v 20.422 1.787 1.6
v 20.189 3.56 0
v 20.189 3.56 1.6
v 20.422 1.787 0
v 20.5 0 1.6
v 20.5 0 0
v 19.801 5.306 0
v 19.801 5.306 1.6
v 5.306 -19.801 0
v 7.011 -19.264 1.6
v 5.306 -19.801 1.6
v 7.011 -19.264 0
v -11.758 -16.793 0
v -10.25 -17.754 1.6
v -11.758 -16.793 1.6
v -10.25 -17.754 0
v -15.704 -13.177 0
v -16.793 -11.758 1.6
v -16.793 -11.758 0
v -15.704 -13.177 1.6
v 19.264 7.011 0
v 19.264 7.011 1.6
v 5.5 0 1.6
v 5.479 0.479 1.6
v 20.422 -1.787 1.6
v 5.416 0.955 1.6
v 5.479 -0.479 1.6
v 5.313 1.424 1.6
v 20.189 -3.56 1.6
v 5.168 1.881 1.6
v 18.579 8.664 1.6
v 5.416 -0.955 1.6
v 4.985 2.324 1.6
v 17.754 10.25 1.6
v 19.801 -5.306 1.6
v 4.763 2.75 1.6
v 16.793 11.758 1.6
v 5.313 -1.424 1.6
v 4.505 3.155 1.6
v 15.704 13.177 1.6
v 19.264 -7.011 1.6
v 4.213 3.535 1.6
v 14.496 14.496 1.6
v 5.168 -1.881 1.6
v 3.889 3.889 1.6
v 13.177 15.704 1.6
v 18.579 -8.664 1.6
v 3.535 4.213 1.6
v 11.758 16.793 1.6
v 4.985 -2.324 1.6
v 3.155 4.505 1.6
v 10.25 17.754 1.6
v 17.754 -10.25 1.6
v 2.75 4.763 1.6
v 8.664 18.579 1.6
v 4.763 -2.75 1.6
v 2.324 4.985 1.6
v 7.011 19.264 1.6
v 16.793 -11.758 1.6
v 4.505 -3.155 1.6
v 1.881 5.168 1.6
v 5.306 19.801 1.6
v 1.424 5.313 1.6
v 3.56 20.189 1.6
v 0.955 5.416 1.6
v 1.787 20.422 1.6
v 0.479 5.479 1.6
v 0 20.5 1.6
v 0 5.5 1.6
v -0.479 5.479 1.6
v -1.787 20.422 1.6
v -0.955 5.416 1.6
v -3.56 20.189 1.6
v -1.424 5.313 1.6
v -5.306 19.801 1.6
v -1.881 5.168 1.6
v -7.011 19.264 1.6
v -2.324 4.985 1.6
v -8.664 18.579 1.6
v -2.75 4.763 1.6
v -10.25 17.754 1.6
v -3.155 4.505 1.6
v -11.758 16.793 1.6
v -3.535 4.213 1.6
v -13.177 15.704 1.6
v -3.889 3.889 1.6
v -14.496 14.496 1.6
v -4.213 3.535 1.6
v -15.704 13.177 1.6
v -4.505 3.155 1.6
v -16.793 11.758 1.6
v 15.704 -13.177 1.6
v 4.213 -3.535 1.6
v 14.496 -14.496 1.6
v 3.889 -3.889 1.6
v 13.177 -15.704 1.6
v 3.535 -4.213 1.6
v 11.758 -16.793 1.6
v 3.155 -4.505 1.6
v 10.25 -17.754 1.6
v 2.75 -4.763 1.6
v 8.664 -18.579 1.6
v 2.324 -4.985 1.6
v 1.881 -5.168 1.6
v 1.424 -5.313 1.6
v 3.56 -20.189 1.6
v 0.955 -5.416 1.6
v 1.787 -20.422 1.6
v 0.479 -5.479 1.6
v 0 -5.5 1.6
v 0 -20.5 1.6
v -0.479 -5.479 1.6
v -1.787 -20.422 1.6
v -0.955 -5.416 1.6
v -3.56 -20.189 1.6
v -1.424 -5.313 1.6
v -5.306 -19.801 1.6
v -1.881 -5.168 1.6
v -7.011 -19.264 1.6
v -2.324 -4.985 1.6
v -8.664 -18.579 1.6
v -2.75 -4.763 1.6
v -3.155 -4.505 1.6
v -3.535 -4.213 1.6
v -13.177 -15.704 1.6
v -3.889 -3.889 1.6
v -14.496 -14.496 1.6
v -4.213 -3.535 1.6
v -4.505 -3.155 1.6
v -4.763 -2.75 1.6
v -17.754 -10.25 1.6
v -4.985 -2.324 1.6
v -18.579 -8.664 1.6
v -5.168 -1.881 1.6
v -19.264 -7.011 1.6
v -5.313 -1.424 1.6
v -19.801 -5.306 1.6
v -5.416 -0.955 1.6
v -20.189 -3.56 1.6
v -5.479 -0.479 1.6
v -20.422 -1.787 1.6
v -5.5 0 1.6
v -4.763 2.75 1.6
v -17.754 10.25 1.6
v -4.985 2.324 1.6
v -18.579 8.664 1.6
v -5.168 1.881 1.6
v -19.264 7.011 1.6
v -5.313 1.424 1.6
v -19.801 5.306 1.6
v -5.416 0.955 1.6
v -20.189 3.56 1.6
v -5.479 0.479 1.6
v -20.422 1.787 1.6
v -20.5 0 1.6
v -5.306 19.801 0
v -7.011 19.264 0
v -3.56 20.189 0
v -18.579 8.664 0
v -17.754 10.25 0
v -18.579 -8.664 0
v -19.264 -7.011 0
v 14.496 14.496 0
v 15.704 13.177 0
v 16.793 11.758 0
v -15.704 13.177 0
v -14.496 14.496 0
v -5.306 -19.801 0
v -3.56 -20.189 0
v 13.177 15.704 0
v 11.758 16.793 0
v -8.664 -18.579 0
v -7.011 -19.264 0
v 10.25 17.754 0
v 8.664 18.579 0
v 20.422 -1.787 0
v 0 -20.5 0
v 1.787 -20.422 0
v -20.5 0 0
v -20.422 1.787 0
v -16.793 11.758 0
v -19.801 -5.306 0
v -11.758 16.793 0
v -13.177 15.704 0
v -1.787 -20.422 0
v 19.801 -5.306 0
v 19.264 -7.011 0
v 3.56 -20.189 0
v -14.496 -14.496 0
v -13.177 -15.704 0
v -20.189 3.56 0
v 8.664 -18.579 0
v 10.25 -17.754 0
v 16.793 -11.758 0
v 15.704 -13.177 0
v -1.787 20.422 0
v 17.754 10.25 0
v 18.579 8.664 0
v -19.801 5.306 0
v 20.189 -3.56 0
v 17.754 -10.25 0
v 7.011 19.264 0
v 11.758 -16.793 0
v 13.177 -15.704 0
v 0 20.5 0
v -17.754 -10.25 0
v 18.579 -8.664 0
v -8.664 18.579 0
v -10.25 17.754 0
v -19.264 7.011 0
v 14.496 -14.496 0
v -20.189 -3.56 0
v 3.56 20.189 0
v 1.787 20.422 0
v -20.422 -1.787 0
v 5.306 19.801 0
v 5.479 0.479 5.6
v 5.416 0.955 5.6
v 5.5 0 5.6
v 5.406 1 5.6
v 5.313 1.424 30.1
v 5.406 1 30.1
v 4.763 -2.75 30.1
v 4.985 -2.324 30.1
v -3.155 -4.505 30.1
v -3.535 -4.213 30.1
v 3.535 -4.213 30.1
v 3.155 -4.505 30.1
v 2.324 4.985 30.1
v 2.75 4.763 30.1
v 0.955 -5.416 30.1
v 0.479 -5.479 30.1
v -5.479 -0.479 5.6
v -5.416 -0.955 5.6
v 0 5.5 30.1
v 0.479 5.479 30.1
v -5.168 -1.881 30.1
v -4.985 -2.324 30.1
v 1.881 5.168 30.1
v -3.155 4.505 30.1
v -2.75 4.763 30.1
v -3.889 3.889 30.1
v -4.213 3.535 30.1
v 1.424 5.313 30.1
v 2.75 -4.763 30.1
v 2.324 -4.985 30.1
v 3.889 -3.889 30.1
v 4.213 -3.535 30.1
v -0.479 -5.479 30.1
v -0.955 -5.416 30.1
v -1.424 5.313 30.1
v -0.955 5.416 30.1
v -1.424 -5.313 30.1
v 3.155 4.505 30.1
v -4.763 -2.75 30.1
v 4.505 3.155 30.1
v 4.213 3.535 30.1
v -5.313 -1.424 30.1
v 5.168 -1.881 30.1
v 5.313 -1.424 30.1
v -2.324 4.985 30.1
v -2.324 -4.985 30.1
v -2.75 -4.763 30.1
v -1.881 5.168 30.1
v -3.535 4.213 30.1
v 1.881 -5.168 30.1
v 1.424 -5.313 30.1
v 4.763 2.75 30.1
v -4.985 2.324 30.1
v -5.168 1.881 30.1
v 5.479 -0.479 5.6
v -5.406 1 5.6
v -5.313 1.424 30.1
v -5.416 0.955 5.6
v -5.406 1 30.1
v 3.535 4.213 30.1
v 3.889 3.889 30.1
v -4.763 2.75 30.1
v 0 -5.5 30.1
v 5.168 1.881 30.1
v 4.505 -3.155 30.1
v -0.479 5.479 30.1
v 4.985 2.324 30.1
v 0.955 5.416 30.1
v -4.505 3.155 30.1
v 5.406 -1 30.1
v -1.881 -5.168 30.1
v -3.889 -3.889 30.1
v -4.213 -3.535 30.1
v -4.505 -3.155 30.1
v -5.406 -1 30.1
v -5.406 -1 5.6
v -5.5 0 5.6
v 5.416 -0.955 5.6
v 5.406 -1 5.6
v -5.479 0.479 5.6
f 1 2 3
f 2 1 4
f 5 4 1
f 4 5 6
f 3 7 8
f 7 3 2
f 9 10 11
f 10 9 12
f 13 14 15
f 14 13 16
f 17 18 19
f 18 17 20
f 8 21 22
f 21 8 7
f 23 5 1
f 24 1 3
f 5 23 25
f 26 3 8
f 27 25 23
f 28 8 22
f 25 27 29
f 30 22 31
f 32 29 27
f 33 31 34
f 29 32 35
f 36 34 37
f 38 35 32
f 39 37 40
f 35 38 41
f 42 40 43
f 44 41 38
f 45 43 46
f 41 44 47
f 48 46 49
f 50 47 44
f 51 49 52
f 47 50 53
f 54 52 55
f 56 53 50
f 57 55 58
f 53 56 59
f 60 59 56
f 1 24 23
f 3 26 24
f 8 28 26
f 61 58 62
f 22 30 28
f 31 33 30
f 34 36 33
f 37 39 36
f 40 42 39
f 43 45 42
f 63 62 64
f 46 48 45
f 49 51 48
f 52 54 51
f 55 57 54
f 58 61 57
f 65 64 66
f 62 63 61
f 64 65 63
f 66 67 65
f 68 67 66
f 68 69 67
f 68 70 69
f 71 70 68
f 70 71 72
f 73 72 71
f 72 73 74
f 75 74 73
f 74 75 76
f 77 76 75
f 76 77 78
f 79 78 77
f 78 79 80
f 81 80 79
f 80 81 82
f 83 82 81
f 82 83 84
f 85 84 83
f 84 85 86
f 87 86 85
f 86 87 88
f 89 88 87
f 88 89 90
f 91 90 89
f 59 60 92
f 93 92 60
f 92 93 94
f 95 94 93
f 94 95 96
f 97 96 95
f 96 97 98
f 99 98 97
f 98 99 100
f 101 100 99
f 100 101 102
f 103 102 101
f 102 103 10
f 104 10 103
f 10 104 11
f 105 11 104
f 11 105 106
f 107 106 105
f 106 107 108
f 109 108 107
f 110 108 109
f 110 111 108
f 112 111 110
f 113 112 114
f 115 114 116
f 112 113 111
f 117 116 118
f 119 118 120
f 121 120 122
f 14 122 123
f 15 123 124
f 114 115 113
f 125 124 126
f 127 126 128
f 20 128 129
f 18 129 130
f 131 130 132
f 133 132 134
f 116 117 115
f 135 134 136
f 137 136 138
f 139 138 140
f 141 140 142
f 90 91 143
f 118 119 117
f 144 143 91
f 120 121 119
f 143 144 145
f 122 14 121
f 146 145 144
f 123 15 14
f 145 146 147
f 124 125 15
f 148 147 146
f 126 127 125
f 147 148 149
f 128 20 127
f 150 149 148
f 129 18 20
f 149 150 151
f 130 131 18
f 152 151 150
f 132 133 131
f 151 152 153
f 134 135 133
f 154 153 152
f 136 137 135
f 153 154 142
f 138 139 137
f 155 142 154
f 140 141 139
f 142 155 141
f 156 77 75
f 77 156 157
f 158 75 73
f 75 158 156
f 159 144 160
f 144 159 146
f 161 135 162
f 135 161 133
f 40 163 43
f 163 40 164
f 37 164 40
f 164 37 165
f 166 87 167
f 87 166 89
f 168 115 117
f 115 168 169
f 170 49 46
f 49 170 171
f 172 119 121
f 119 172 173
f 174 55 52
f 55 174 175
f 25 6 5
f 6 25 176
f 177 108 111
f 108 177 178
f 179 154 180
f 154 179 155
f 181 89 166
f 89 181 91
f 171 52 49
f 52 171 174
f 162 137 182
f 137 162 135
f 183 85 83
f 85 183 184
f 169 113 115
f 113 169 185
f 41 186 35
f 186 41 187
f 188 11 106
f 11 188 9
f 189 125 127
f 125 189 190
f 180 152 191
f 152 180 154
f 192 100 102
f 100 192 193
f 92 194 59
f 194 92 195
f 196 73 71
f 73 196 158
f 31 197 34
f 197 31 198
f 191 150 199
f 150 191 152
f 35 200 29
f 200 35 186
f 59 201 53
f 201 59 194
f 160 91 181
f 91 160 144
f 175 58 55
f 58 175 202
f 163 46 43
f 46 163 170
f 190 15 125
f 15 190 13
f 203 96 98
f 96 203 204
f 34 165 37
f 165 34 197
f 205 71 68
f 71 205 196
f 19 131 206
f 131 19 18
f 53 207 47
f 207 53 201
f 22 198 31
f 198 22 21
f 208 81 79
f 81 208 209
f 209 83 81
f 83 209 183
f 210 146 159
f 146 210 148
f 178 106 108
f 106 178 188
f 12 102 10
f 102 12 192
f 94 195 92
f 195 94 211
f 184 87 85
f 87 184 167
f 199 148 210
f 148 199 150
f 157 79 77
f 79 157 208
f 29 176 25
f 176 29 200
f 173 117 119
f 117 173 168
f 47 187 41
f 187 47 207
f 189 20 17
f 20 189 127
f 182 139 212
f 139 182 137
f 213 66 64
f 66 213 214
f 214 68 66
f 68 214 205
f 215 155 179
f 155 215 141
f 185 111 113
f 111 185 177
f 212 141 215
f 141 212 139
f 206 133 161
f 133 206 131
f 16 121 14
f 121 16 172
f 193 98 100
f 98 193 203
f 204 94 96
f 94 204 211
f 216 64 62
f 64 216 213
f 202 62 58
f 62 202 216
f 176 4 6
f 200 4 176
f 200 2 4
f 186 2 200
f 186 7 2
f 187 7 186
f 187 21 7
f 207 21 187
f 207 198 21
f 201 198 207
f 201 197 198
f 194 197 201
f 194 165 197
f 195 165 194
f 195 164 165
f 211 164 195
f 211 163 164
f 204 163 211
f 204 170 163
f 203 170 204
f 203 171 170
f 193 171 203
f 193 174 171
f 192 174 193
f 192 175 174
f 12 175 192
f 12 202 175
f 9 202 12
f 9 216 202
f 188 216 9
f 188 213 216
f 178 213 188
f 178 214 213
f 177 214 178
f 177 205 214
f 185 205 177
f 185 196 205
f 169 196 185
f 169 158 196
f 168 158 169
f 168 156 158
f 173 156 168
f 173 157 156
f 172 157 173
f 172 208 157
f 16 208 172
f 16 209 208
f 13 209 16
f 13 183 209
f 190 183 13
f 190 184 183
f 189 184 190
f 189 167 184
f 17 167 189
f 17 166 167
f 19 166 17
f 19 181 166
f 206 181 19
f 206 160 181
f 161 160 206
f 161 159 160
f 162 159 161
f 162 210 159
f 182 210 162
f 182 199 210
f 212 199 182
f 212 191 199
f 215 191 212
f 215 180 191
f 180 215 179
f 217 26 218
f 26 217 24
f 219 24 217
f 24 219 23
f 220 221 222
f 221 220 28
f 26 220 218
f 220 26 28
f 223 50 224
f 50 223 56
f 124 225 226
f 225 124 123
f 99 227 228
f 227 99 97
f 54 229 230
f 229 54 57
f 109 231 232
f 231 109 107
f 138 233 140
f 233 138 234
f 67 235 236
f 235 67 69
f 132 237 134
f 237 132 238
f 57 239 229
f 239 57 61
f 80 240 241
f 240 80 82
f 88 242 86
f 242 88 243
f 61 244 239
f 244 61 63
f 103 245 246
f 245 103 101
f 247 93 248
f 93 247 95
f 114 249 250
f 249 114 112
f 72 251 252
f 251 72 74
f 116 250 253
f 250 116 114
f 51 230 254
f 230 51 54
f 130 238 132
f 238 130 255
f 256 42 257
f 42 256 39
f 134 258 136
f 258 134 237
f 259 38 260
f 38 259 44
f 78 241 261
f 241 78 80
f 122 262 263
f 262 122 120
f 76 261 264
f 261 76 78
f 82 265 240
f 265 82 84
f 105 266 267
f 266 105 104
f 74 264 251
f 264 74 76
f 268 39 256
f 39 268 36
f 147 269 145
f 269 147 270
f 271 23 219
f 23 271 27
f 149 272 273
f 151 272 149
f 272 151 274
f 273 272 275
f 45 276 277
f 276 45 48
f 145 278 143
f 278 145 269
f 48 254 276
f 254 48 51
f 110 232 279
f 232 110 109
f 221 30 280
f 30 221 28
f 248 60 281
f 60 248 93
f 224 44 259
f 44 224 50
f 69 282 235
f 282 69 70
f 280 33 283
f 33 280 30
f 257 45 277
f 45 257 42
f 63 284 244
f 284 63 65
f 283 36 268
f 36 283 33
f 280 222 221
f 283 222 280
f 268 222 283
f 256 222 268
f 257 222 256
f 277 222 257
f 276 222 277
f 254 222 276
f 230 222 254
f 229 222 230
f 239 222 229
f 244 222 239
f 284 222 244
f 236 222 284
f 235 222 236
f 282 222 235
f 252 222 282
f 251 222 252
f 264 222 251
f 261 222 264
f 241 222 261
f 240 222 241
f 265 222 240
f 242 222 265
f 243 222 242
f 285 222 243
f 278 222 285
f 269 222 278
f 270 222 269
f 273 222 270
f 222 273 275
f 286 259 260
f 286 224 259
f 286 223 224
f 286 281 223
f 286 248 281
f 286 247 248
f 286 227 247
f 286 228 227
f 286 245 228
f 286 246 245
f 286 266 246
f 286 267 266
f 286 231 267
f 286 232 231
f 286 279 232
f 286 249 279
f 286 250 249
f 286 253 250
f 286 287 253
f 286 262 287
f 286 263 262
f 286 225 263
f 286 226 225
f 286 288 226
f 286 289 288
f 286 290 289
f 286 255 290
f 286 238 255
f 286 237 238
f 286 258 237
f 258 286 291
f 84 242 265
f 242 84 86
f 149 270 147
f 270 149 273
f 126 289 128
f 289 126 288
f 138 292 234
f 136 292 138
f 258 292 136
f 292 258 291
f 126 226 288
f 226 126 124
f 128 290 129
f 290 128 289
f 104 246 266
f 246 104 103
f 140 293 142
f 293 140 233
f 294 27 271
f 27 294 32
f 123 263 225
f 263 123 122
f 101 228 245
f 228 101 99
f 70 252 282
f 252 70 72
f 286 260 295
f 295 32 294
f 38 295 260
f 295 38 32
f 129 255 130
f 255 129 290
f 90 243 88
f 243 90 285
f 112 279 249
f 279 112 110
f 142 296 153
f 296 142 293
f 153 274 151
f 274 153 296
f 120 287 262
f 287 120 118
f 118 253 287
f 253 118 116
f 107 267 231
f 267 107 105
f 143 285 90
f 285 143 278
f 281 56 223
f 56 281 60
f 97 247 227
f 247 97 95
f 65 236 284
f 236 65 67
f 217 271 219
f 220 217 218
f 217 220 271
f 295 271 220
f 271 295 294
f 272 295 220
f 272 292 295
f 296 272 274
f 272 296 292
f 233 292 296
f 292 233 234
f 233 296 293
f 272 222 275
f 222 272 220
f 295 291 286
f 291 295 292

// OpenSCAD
coef = 10;

difference() {
	union() {
		translate([0,0,.08*coef]) cylinder(h=.16*coef,r=2.05*coef,$fn=72,center=true);
		translate([0,0,1.51*coef]) cylinder(h=3*coef,r=0.55*coef,$fn=72,center=true);
	}
	translate([0,0,1.81*coef]) cube([1.1*coef,0.2*coef,2.5*coef],center=true);
}
